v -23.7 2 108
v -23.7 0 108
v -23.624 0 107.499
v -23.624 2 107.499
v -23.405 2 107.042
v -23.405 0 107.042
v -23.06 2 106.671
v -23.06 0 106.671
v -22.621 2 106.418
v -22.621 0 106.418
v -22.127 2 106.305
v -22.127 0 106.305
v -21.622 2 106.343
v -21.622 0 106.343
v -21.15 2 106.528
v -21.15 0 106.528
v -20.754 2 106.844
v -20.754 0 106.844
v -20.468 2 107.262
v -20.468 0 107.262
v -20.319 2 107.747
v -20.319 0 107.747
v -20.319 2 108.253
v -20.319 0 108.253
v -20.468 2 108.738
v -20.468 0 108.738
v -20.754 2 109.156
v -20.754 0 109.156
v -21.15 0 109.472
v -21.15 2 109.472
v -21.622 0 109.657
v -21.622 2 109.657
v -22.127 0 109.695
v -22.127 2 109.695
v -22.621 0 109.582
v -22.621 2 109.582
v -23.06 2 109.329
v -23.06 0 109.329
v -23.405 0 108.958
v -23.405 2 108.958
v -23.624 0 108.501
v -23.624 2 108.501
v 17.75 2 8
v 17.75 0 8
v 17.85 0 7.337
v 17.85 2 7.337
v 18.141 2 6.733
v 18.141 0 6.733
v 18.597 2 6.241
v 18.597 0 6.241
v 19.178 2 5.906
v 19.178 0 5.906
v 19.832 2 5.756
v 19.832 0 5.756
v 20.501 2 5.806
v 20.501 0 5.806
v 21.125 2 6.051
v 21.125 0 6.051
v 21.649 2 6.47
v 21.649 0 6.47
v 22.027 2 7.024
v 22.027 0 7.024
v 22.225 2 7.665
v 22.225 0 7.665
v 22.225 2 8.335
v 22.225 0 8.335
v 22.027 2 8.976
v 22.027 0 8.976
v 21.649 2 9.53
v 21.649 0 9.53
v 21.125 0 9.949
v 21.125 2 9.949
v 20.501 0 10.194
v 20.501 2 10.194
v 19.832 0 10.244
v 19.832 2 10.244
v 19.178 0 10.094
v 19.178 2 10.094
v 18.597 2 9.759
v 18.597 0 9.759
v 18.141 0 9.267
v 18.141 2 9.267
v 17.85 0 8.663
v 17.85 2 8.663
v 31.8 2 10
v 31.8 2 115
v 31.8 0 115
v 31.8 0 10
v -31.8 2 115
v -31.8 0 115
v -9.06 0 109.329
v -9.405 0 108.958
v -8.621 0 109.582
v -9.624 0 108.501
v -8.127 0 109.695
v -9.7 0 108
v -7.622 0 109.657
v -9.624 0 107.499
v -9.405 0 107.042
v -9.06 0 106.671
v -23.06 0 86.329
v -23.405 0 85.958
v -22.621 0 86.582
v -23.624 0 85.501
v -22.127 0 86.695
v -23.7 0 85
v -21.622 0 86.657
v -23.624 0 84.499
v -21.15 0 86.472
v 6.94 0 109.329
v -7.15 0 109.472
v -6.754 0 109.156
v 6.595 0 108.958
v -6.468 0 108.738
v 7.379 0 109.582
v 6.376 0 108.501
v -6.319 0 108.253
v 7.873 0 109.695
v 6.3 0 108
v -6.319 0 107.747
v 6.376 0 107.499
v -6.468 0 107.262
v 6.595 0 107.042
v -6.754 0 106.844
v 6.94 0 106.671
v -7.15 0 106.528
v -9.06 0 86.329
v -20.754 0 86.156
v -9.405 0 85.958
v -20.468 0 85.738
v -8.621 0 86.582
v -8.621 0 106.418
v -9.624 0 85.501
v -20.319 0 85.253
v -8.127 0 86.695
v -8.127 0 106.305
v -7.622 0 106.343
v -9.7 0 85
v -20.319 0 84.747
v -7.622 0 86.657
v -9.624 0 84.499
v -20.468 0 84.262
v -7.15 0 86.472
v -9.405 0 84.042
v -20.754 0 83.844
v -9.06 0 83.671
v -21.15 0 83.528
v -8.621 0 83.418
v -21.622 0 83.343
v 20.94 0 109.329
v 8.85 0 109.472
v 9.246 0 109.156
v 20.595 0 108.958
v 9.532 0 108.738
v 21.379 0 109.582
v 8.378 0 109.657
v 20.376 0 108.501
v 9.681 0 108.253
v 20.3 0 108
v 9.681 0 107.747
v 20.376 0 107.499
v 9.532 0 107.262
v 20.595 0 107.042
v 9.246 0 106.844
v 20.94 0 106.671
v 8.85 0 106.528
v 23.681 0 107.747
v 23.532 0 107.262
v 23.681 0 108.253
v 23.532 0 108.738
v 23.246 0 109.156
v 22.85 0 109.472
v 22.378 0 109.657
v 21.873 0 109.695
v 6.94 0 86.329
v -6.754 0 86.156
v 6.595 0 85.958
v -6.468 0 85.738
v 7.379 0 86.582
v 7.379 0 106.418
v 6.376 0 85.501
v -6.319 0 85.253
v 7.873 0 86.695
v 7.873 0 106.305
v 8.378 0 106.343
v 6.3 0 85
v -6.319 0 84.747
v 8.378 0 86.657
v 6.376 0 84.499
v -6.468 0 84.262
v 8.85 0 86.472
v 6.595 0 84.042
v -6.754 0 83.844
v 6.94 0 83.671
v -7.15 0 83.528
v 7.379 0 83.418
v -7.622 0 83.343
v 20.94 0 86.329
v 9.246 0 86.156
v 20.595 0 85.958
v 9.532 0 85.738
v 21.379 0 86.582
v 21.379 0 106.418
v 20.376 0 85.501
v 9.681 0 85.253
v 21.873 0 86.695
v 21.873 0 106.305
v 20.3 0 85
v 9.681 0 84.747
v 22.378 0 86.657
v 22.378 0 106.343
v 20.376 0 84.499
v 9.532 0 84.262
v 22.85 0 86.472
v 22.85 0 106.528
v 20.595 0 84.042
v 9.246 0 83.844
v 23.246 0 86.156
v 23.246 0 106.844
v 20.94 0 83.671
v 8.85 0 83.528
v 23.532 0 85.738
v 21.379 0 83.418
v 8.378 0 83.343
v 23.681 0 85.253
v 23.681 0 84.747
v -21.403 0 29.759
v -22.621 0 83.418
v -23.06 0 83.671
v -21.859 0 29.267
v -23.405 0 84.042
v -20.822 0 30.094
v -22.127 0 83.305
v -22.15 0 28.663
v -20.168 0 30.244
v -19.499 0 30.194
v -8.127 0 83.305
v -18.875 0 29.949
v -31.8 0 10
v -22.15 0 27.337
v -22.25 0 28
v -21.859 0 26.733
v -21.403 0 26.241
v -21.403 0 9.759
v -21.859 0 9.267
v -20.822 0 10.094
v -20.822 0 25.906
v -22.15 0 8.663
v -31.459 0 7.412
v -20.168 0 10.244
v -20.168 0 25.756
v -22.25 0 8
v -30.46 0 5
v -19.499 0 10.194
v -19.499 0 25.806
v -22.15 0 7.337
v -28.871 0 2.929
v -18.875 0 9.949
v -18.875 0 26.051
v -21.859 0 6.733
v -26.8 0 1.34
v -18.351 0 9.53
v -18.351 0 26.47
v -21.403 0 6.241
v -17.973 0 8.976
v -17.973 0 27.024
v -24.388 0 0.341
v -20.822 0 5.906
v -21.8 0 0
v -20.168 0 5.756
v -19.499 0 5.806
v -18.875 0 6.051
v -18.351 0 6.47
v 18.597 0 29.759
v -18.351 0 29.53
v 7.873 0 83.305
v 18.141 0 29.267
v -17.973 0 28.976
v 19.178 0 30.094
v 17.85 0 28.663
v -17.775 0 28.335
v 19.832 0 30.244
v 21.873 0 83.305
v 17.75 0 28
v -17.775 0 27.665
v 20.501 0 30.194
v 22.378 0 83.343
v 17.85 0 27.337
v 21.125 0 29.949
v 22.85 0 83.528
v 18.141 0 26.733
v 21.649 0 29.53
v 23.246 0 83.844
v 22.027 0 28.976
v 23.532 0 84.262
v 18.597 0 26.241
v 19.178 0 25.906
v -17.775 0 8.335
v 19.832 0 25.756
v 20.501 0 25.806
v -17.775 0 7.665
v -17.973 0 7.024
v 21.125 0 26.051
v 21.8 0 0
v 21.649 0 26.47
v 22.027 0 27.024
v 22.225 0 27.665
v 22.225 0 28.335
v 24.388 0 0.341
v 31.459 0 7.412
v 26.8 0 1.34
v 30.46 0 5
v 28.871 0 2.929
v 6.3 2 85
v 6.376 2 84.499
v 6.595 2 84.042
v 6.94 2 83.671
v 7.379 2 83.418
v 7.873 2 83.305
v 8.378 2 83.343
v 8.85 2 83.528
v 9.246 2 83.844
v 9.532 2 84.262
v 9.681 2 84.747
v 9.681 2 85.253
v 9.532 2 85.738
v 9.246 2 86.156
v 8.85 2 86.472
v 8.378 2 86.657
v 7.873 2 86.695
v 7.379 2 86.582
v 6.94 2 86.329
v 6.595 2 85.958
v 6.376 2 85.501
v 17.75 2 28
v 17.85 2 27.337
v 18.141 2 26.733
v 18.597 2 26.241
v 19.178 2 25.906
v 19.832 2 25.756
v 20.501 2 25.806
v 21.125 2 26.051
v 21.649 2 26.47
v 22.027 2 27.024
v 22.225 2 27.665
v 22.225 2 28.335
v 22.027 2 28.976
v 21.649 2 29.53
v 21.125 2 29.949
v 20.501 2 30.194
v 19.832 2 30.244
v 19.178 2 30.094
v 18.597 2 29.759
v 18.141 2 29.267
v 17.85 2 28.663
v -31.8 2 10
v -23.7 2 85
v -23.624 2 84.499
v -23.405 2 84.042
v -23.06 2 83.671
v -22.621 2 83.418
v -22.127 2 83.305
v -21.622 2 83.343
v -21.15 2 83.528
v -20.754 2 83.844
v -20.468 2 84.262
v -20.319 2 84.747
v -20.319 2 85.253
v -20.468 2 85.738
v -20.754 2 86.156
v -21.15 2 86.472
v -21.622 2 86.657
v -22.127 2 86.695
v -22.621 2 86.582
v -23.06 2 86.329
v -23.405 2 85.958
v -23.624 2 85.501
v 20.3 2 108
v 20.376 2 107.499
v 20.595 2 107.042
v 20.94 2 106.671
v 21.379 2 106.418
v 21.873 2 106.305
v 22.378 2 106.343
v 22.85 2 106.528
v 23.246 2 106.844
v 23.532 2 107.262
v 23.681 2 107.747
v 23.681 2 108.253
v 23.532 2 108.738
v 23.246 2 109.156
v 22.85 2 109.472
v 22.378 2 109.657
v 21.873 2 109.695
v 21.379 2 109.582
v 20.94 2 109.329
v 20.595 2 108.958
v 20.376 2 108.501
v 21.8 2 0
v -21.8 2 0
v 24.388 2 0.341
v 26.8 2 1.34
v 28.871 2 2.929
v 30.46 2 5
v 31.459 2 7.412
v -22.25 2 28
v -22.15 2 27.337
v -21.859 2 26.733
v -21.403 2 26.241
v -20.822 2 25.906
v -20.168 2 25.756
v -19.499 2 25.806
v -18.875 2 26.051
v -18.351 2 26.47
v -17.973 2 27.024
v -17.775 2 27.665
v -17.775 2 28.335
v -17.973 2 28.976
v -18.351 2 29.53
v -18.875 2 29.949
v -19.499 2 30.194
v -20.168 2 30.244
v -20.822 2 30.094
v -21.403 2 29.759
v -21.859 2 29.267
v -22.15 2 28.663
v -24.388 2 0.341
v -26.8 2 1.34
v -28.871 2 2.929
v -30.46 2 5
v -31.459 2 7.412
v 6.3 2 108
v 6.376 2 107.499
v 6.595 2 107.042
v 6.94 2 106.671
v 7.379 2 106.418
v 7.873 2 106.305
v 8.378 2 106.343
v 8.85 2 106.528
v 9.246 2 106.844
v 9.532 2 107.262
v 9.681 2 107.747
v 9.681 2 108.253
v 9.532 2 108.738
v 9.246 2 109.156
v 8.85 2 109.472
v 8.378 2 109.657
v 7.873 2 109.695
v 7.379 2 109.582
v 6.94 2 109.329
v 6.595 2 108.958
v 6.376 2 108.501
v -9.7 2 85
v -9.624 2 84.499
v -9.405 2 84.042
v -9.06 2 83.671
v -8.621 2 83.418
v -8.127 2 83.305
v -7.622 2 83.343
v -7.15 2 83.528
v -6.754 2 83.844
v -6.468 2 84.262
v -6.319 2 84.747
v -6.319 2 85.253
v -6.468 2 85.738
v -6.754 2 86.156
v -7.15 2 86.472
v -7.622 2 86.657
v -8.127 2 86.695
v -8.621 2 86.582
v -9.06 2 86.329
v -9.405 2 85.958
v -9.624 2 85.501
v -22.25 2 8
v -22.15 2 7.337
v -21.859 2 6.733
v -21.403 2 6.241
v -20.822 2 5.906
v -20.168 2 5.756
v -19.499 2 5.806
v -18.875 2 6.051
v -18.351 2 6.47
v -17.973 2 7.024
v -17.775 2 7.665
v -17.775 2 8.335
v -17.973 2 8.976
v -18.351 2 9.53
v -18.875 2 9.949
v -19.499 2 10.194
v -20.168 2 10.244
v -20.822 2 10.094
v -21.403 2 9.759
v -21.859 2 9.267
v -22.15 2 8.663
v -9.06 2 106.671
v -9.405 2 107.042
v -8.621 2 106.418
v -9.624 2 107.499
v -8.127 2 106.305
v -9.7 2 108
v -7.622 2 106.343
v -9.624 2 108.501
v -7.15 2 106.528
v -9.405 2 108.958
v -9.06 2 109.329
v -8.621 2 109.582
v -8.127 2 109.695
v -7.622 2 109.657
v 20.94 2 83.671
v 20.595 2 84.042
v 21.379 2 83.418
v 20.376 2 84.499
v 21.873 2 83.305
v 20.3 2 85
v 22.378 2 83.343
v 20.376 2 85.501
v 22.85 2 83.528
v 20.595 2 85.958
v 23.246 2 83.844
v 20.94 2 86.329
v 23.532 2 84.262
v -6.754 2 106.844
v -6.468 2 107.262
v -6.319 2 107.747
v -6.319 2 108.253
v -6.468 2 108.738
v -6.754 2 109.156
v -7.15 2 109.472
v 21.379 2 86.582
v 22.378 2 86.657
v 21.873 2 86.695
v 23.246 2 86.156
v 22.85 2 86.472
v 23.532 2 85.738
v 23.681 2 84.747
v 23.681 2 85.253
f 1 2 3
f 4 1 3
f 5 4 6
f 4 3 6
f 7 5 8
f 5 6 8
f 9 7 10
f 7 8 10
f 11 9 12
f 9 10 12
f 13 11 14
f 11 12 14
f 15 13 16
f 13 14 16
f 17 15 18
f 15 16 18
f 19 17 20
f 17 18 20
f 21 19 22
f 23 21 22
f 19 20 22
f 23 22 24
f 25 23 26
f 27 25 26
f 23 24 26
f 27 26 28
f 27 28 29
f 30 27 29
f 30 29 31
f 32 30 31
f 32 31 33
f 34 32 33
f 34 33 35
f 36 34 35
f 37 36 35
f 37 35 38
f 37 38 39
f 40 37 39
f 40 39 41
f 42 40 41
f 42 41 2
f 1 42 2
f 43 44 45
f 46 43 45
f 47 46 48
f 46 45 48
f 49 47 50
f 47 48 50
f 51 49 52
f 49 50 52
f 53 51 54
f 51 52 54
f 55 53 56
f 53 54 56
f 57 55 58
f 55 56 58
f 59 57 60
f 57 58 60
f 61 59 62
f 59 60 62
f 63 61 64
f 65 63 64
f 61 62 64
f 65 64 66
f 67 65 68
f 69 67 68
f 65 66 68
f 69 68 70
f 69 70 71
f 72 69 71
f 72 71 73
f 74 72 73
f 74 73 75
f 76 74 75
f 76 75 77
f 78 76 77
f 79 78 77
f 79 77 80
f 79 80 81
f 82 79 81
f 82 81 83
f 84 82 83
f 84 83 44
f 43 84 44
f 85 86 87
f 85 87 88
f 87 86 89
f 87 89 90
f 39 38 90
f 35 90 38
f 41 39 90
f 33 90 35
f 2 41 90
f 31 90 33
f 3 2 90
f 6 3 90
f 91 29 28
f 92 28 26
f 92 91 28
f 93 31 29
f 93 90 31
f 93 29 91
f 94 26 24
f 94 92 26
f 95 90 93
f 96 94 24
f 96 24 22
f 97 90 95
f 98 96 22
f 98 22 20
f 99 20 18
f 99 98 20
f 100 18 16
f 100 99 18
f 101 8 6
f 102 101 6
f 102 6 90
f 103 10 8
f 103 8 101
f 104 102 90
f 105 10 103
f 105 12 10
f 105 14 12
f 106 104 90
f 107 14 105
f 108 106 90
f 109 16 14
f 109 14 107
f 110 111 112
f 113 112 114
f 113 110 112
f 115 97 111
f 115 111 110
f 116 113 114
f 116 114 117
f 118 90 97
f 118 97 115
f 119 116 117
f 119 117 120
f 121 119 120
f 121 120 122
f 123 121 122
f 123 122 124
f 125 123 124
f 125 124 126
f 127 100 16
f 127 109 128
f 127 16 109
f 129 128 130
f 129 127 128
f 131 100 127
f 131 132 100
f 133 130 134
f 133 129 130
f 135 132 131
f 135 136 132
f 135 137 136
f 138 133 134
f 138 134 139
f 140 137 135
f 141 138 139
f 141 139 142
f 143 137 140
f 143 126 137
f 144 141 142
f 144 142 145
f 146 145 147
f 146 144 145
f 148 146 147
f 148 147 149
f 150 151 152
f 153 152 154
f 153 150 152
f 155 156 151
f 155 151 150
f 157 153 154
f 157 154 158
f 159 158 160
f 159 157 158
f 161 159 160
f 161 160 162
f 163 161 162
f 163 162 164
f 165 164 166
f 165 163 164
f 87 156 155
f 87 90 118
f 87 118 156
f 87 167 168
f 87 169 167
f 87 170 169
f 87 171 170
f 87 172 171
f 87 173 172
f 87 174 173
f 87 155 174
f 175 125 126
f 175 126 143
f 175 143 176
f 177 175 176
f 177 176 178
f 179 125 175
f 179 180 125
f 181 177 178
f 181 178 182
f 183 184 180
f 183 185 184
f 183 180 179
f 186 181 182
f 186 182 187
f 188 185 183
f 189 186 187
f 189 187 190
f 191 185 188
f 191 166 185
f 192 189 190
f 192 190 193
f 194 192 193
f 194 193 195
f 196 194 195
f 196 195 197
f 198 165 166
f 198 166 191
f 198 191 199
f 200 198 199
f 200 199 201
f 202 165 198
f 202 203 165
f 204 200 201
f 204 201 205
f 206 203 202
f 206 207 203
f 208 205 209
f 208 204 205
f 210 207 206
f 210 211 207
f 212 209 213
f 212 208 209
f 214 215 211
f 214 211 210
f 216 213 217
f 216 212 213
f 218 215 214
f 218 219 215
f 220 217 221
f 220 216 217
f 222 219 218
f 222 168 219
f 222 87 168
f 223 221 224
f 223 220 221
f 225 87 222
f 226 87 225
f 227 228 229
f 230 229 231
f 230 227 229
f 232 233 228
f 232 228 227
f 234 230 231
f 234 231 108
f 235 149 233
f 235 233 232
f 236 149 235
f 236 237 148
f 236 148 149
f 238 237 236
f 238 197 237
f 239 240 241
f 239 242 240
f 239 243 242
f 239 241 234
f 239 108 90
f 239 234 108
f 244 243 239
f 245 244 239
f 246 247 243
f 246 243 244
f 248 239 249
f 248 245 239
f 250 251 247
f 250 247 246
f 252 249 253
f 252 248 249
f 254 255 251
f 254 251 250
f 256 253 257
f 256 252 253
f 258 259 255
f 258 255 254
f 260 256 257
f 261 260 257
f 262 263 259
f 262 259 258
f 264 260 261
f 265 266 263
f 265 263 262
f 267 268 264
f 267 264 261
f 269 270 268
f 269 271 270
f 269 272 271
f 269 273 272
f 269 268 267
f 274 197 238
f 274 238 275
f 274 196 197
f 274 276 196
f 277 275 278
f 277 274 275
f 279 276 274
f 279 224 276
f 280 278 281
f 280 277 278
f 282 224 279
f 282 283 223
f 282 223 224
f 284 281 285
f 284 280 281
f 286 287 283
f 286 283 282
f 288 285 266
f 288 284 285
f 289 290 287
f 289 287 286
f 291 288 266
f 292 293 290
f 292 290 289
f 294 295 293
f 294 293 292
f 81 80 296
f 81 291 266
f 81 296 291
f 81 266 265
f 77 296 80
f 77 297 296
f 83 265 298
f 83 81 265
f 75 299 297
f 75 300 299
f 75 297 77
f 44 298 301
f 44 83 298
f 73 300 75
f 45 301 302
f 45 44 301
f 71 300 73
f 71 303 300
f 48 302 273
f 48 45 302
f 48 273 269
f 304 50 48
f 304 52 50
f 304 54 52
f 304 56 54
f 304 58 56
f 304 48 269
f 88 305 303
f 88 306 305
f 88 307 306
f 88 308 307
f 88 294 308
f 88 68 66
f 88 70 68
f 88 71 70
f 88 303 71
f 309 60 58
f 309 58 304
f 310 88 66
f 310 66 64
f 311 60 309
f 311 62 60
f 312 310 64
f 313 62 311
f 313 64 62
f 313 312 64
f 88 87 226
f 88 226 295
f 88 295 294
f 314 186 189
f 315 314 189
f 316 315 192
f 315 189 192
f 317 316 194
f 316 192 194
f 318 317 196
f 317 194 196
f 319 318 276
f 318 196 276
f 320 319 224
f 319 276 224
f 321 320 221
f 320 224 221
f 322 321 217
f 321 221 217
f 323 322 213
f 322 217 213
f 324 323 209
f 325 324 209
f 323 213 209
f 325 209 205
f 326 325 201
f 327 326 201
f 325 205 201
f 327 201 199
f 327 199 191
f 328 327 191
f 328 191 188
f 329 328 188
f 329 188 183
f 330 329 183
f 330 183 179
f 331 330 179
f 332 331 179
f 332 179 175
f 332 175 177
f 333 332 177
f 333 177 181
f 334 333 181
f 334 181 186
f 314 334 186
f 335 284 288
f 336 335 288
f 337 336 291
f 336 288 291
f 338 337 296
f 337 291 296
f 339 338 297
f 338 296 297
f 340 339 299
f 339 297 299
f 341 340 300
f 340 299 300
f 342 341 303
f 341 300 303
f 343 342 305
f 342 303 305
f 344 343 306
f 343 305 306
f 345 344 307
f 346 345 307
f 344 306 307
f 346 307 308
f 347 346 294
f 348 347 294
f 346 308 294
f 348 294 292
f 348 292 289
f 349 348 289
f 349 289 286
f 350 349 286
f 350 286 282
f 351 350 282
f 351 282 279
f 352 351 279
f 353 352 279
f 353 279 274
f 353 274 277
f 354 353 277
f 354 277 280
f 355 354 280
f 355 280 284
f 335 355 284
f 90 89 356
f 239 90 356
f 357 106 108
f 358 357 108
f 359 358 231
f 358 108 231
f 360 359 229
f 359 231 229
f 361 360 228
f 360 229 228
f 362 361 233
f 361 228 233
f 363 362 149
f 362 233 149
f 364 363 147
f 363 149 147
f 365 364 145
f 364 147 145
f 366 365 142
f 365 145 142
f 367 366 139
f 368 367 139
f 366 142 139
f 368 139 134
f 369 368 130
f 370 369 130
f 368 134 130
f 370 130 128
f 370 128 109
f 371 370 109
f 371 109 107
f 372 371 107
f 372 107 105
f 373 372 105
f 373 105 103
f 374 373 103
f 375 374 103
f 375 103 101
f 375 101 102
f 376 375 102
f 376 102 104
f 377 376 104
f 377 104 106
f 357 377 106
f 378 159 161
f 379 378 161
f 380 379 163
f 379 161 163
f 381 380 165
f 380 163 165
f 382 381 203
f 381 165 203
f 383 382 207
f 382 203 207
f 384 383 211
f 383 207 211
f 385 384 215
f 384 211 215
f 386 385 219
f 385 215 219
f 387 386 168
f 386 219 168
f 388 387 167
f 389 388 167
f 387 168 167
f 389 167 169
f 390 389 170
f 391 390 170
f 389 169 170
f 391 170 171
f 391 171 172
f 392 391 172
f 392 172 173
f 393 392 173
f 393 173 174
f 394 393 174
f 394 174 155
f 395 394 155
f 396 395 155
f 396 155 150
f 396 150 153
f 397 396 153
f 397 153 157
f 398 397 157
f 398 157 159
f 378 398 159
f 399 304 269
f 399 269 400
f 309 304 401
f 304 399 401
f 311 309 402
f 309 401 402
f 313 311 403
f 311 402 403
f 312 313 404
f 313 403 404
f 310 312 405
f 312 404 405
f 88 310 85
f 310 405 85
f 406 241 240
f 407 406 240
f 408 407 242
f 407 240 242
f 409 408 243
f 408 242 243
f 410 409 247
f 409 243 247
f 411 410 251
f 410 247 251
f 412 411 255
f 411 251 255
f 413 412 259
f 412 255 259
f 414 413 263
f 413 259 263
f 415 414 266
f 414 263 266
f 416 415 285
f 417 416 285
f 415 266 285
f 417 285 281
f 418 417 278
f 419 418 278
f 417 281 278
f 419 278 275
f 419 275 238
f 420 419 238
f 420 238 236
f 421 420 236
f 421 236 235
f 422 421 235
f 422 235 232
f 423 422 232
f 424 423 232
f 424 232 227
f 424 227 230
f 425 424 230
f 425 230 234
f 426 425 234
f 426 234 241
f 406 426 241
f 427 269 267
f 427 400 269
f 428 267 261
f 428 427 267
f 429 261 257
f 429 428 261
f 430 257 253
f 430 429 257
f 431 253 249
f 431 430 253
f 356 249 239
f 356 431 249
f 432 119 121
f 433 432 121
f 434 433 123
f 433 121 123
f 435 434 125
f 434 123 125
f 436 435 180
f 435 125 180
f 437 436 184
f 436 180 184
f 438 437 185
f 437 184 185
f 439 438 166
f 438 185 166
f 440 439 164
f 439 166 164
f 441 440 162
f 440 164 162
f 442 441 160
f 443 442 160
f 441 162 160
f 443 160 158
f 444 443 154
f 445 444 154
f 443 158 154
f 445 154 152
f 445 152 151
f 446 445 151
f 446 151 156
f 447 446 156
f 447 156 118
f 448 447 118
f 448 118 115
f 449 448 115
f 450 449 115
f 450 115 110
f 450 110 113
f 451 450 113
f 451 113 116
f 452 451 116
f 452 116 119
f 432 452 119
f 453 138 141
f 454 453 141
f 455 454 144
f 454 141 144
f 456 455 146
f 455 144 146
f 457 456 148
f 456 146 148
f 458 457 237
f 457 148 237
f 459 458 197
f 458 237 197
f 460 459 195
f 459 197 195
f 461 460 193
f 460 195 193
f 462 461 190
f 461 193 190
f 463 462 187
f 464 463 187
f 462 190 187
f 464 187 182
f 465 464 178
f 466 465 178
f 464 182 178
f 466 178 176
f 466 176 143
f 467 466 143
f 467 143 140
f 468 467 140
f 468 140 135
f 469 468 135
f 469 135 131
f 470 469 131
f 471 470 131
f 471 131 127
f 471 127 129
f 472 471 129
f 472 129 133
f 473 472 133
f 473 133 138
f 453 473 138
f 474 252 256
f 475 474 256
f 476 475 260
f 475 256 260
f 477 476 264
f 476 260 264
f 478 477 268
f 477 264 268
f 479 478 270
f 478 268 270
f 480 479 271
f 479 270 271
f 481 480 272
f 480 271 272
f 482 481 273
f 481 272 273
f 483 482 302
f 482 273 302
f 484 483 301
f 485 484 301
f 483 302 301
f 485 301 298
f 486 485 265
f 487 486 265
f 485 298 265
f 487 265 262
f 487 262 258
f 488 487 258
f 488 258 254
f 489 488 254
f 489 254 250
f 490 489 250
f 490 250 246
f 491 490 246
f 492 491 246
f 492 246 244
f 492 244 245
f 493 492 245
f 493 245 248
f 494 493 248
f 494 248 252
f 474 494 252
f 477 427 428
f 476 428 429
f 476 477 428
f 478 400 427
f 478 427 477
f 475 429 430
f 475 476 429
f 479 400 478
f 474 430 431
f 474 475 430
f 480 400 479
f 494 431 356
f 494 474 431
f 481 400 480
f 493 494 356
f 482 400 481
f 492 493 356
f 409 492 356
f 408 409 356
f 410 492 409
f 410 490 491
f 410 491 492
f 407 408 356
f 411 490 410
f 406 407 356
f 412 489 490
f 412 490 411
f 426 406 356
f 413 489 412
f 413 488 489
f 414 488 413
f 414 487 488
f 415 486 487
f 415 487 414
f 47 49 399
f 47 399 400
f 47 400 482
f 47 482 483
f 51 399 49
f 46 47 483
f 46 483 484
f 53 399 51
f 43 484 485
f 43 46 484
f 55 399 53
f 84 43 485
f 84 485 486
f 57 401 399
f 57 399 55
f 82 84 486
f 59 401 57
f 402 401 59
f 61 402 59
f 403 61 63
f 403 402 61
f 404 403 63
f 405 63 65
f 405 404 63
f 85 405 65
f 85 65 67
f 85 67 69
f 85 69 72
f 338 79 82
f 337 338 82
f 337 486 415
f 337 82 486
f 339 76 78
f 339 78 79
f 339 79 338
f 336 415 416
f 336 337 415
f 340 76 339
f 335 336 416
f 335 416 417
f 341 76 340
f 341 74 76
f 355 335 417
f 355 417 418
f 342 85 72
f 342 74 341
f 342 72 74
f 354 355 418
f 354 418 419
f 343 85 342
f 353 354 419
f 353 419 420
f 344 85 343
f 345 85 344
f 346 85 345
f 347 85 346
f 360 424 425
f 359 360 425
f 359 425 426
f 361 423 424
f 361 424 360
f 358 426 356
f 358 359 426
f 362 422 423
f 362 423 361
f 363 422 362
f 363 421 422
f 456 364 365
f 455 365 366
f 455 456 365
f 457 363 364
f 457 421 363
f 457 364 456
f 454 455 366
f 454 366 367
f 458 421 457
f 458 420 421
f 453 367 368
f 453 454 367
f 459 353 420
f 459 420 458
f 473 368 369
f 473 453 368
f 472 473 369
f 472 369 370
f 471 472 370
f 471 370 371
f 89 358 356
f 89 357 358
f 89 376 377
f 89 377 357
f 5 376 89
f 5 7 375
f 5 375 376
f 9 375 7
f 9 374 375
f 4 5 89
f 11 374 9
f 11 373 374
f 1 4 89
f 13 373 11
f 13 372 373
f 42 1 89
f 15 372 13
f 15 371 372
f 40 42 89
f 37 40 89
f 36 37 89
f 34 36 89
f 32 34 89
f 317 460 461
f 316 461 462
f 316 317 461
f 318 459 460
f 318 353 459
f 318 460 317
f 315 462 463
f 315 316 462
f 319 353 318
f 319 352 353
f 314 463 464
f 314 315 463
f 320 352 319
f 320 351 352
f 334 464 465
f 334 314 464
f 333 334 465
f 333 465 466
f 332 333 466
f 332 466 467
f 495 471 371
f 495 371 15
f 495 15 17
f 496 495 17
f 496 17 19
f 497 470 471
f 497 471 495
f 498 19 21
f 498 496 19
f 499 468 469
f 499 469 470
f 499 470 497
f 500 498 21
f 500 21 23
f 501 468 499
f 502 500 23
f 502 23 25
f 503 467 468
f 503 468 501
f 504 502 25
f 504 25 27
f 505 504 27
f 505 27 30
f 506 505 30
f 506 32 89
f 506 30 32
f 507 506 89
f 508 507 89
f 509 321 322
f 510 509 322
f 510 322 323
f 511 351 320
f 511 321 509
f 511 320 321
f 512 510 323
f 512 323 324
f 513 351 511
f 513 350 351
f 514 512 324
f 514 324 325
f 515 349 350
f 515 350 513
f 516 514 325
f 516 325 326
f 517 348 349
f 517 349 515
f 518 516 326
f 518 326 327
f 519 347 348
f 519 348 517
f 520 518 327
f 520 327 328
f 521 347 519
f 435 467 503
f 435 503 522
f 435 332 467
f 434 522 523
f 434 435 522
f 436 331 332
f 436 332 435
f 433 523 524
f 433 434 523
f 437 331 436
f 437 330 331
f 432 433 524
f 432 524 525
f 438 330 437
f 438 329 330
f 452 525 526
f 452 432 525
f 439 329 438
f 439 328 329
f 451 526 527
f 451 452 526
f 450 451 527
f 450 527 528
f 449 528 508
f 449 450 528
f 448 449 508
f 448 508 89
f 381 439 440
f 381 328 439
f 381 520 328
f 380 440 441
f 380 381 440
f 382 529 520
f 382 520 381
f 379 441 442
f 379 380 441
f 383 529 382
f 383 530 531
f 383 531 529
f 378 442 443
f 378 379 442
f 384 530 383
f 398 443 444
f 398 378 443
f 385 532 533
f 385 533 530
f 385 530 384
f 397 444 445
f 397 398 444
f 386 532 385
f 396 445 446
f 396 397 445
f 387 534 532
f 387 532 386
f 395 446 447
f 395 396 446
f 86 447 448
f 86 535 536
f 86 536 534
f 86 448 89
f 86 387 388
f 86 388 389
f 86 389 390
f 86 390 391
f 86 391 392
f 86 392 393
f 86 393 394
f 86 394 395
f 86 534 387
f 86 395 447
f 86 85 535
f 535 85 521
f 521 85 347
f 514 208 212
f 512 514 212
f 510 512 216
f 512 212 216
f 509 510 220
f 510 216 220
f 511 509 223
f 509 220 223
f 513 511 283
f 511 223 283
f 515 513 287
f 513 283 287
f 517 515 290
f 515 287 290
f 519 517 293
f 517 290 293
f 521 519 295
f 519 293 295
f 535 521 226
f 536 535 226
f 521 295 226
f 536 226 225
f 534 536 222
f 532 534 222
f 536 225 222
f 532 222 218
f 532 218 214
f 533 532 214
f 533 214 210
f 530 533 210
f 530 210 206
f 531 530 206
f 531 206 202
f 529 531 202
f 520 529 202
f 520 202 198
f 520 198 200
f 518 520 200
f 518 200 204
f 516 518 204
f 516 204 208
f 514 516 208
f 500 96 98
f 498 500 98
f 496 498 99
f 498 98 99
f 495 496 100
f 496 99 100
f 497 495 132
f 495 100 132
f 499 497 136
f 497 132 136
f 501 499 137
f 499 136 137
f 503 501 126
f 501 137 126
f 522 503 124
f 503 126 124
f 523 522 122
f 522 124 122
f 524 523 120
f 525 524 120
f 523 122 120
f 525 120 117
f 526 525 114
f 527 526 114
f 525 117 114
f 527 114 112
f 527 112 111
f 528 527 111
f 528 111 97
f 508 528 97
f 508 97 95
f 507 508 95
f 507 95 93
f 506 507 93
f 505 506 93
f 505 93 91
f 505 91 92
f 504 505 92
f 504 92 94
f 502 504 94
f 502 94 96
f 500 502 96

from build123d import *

# Parameters (mm, degrees)
SHEET_EXTRUDE_DEPTH      = 31.8
M3_CLEARANCE_HOLE1_D     = 3.4
M3_CLEARANCE_HOLE1_DEPTH = 8.5
M3_CLEARANCE_HOLE1_TIP   = 1.021463052
M4_CLEARANCE_HOLE1_D     = 4.5
M4_CLEARANCE_HOLE1_DEPTH = 8.5
M4_CLEARANCE_HOLE1_TIP   = 1.351936393
FILLET1_R                = 10


with BuildPart() as part:
    # Sketch2 → Sheet Extrude (new body, symmetric)
    with BuildSketch(Plane(origin=(0, 0, 0), x_dir=(0, 0, -1), z_dir=(1, 0, 0))):
        Polygon((0, 0), (0, 2), (-35, 2), (-55, 2), (-115, 2), (-115, 0), (-55, 0), (-35, 0), align=None)
    extrude(amount=SHEET_EXTRUDE_DEPTH, both=True)

    # M3 Clearance Hole1
    with Locations(Plane(origin=(0, 2, 0), x_dir=(1, 0, 0), z_dir=(0, 1, 0))):
        with Locations((-22, -108), (-22, -85), (-8, -85), (-8, -108), (22, -108), (8, -108), (8, -85), (22, -85)):
            Hole(M3_CLEARANCE_HOLE1_D / 2, depth=M3_CLEARANCE_HOLE1_DEPTH)
            with Locations((0, 0, -(M3_CLEARANCE_HOLE1_DEPTH + M3_CLEARANCE_HOLE1_TIP / 2))):  # 118° drill point
                Cone(0, M3_CLEARANCE_HOLE1_D / 2, M3_CLEARANCE_HOLE1_TIP, mode=Mode.SUBTRACT)

    # M4 Clearance Hole1
    with Locations(Plane(origin=(0, 2, 0), x_dir=(1, 0, 0), z_dir=(0, 1, 0))):
        with Locations((-20, -28), (20, -28), (20, -8), (-20, -8)):
            Hole(M4_CLEARANCE_HOLE1_D / 2, depth=M4_CLEARANCE_HOLE1_DEPTH)
            with Locations((0, 0, -(M4_CLEARANCE_HOLE1_DEPTH + M4_CLEARANCE_HOLE1_TIP / 2))):  # 118° drill point
                Cone(0, M4_CLEARANCE_HOLE1_D / 2, M4_CLEARANCE_HOLE1_TIP, mode=Mode.SUBTRACT)

    # Fillet1
    fillet1_edges = [part.edges().sort_by_distance(p)[0] for p in [
        (-31.8, 1, 0),
        (31.8, 1, 0),
    ]]
    fillet(fillet1_edges, radius=FILLET1_R)


solid = part.part
